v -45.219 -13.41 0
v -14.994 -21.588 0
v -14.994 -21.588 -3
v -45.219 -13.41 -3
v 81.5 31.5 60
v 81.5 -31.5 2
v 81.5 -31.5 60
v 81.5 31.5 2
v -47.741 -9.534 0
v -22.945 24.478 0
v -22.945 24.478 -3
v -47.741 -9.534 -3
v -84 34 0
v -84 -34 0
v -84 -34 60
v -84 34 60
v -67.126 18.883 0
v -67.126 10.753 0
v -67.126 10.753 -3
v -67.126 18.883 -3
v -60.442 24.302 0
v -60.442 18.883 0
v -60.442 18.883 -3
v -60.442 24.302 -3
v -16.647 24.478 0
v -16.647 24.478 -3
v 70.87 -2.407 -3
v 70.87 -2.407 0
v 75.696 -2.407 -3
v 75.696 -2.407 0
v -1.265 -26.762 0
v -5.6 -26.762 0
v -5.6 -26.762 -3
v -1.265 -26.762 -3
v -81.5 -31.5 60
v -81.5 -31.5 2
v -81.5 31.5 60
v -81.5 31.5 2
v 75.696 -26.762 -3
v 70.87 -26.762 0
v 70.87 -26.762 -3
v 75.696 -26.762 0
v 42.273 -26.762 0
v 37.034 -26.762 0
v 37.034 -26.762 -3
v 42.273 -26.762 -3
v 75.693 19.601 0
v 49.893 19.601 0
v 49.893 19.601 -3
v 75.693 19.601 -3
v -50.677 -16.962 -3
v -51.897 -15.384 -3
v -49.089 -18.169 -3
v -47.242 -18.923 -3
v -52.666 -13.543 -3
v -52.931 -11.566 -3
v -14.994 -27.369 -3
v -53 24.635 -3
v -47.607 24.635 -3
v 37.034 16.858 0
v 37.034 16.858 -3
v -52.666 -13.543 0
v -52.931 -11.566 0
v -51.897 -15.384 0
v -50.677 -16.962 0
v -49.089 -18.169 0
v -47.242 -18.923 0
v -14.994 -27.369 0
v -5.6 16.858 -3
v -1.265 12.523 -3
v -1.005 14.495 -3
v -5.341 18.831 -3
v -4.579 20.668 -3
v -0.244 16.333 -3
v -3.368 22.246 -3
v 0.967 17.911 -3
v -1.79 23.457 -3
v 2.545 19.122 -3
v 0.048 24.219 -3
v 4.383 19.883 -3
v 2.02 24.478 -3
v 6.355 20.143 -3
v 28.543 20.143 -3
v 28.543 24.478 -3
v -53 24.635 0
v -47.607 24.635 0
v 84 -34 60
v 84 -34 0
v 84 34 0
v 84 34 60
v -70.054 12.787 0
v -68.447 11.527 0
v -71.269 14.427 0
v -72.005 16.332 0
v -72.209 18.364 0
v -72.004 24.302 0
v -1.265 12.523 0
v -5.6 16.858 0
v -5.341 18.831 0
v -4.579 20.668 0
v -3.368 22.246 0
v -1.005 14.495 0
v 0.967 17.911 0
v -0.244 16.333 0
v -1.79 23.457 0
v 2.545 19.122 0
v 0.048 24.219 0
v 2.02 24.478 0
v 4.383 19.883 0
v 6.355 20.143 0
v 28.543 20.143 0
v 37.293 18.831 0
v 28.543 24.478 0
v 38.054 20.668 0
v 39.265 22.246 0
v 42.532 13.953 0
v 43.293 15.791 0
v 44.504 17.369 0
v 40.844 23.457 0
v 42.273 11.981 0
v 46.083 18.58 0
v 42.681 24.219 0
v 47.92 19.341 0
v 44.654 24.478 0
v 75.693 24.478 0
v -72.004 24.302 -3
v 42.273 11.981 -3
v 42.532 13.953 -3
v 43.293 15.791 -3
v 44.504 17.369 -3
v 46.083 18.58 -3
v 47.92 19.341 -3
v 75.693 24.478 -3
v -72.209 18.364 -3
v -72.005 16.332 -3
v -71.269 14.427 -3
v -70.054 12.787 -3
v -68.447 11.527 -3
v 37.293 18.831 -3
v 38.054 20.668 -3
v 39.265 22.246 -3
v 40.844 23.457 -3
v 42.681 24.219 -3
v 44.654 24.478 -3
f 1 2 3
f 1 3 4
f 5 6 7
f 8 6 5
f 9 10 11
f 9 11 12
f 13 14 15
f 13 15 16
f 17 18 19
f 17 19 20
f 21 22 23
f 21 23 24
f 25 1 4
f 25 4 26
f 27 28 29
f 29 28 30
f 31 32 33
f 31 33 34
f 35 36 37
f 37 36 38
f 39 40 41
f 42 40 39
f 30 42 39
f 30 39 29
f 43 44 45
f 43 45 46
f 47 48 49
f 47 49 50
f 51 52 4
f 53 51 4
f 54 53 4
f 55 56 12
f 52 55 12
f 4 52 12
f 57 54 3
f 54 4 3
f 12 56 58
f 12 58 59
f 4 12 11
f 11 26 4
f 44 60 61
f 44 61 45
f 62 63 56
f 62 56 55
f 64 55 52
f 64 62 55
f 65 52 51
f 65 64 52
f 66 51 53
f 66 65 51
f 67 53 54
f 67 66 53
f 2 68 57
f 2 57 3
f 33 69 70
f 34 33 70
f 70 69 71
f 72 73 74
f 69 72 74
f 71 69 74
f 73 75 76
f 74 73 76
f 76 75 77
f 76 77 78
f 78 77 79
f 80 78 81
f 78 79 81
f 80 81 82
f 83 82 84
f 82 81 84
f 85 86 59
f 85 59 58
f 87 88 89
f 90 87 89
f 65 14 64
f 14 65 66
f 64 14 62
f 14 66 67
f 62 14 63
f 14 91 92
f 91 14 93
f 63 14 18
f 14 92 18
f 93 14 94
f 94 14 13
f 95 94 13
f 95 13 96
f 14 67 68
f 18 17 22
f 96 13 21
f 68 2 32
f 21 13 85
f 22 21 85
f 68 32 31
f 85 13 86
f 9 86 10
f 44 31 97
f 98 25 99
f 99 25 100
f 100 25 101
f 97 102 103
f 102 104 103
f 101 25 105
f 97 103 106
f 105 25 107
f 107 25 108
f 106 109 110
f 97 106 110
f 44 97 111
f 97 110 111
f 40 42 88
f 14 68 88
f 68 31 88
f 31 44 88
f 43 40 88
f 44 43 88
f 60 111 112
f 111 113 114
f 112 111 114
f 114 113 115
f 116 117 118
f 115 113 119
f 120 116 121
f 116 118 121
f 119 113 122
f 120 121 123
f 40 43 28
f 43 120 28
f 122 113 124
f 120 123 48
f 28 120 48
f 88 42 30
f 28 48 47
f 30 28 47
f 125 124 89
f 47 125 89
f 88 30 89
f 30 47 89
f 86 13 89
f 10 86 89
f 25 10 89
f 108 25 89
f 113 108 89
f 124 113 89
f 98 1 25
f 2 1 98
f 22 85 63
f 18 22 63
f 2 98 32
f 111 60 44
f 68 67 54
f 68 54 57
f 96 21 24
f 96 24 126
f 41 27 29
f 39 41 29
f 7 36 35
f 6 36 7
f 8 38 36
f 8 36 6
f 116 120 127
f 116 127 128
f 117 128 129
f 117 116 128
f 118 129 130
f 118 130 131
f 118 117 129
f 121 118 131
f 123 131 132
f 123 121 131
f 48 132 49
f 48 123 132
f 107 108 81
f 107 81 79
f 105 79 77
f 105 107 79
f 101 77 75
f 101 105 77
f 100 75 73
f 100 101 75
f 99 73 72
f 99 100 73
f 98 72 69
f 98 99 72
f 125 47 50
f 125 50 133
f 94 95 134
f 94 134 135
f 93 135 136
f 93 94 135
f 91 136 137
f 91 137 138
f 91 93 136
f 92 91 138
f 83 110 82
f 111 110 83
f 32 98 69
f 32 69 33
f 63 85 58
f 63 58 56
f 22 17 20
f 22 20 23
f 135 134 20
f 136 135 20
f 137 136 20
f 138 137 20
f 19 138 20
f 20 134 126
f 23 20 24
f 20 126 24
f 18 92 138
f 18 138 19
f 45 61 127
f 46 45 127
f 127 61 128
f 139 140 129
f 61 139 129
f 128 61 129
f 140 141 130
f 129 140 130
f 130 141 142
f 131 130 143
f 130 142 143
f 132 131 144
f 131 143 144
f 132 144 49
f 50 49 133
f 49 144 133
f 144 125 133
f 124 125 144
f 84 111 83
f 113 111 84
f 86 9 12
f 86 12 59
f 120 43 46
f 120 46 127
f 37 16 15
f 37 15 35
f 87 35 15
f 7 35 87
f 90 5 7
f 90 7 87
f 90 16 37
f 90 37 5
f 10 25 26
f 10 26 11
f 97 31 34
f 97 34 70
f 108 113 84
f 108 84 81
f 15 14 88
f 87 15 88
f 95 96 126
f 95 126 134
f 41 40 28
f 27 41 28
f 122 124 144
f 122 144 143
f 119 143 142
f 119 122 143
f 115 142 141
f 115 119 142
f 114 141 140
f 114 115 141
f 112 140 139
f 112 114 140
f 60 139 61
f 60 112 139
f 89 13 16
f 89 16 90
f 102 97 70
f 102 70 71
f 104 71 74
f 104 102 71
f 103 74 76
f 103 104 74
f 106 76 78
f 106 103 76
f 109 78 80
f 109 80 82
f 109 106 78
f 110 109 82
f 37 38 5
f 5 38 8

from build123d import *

# Parameters (mm, degrees)
F0_W     = 168
F0_H     = 68
F0_W_2   = 163
F0_H_2   = 63
F1_DEPTH = 60
F2_DEPTH = 2
F3_W     = 4.826
F3_H     = 24.355216
F4_DEPTH = 3


with BuildPart() as f1:
    # F0 (on Top) → F1 (new body)
    with BuildSketch(Plane.XY):
        Rectangle(F0_W, F0_H)
        Rectangle(F0_W_2, F0_H_2, mode=Mode.SUBTRACT)
    extrude(amount=F1_DEPTH)

    # F0 (on Top) → F2 (join)
    with BuildSketch(Plane.XY):
        Rectangle(F0_W_2, F0_H_2)
    extrude(amount=F2_DEPTH)

    # F3 (on face) → F4 (join)
    with BuildSketch(Plane.XY):
        with BuildLine():
            Line((-60.442161, 24.30206), (-72.00386, 24.30206))
            Line((-72.00386, 24.30206), (-72.208633, 18.363613))
            ThreePointArc((-72.208633, 18.363613), (-71.269145, 14.427374), (-68.446746, 11.527256))
            Line((-68.446746, 11.527256), (-67.12627, 10.753183))
            Line((-67.12627, 10.753183), (-67.12627, 18.882509))
            Line((-67.12627, 18.882509), (-60.442161, 18.882509))
            Line((-60.442161, 18.882509), (-60.442161, 24.30206))
        make_face()
        with BuildLine():
            Line((-47.606919, 24.634736), (-53.000022, 24.634736))
            Line((-53.000022, 24.634736), (-52.930937, -11.566137))
            ThreePointArc((-52.930937, -11.566137), (-51.338734, -16.213165), (-47.241549, -18.922972))
            Line((-47.241549, -18.922972), (-14.994091, -27.368734))
            Line((-14.994091, -27.368734), (-14.994091, -21.587882))
            Line((-14.994091, -21.587882), (-45.218573, -13.409639))
            Line((-45.218573, -13.409639), (-16.646753, 24.478305))
            Line((-16.646753, 24.478305), (-22.944923, 24.478305))
            Line((-22.944923, 24.478305), (-47.740912, -9.533542))
            Line((-47.740912, -9.533542), (-47.606919, 24.634736))
        make_face()
        with BuildLine():
            Line((-5.600203, 16.858305), (-5.600203, -26.761888))
            Line((-5.600203, -26.761888), (-1.264561, -26.761888))
            Line((-1.264561, -26.761888), (-1.264561, 12.522665))
            ThreePointArc((-1.264561, 12.522665), (0.967285, 17.910819), (6.355439, 20.142665))
            Line((6.355439, 20.142665), (28.542969, 20.142665))
            Line((28.542969, 20.142665), (28.542969, 24.478305))
            Line((28.542969, 24.478305), (2.019797, 24.478305))
            ThreePointArc((2.019797, 24.478305), (-3.368357, 22.246459), (-5.600203, 16.858305))
        make_face()
        with BuildLine():
            ThreePointArc((44.653603, 24.478305), (39.265449, 22.246459), (37.033603, 16.858305))
            Line((37.033603, 16.858305), (37.033603, -26.761888))
            Line((37.033603, -26.761888), (42.272501, -26.761888))
            Line((42.272501, -26.761888), (42.272501, 11.980708))
            ThreePointArc((42.272501, 11.980708), (44.504347, 17.368862), (49.892501, 19.600708))
            Line((49.892501, 19.600708), (75.693063, 19.600708))
            Line((75.693063, 19.600708), (75.693063, 24.478305))
            Line((75.693063, 24.478305), (44.653603, 24.478305))
        make_face()
        with Locations((73.283109, -14.58428)):
            Rectangle(F3_W, F3_H)
    extrude(amount=-F4_DEPTH)


solid = f1.part
